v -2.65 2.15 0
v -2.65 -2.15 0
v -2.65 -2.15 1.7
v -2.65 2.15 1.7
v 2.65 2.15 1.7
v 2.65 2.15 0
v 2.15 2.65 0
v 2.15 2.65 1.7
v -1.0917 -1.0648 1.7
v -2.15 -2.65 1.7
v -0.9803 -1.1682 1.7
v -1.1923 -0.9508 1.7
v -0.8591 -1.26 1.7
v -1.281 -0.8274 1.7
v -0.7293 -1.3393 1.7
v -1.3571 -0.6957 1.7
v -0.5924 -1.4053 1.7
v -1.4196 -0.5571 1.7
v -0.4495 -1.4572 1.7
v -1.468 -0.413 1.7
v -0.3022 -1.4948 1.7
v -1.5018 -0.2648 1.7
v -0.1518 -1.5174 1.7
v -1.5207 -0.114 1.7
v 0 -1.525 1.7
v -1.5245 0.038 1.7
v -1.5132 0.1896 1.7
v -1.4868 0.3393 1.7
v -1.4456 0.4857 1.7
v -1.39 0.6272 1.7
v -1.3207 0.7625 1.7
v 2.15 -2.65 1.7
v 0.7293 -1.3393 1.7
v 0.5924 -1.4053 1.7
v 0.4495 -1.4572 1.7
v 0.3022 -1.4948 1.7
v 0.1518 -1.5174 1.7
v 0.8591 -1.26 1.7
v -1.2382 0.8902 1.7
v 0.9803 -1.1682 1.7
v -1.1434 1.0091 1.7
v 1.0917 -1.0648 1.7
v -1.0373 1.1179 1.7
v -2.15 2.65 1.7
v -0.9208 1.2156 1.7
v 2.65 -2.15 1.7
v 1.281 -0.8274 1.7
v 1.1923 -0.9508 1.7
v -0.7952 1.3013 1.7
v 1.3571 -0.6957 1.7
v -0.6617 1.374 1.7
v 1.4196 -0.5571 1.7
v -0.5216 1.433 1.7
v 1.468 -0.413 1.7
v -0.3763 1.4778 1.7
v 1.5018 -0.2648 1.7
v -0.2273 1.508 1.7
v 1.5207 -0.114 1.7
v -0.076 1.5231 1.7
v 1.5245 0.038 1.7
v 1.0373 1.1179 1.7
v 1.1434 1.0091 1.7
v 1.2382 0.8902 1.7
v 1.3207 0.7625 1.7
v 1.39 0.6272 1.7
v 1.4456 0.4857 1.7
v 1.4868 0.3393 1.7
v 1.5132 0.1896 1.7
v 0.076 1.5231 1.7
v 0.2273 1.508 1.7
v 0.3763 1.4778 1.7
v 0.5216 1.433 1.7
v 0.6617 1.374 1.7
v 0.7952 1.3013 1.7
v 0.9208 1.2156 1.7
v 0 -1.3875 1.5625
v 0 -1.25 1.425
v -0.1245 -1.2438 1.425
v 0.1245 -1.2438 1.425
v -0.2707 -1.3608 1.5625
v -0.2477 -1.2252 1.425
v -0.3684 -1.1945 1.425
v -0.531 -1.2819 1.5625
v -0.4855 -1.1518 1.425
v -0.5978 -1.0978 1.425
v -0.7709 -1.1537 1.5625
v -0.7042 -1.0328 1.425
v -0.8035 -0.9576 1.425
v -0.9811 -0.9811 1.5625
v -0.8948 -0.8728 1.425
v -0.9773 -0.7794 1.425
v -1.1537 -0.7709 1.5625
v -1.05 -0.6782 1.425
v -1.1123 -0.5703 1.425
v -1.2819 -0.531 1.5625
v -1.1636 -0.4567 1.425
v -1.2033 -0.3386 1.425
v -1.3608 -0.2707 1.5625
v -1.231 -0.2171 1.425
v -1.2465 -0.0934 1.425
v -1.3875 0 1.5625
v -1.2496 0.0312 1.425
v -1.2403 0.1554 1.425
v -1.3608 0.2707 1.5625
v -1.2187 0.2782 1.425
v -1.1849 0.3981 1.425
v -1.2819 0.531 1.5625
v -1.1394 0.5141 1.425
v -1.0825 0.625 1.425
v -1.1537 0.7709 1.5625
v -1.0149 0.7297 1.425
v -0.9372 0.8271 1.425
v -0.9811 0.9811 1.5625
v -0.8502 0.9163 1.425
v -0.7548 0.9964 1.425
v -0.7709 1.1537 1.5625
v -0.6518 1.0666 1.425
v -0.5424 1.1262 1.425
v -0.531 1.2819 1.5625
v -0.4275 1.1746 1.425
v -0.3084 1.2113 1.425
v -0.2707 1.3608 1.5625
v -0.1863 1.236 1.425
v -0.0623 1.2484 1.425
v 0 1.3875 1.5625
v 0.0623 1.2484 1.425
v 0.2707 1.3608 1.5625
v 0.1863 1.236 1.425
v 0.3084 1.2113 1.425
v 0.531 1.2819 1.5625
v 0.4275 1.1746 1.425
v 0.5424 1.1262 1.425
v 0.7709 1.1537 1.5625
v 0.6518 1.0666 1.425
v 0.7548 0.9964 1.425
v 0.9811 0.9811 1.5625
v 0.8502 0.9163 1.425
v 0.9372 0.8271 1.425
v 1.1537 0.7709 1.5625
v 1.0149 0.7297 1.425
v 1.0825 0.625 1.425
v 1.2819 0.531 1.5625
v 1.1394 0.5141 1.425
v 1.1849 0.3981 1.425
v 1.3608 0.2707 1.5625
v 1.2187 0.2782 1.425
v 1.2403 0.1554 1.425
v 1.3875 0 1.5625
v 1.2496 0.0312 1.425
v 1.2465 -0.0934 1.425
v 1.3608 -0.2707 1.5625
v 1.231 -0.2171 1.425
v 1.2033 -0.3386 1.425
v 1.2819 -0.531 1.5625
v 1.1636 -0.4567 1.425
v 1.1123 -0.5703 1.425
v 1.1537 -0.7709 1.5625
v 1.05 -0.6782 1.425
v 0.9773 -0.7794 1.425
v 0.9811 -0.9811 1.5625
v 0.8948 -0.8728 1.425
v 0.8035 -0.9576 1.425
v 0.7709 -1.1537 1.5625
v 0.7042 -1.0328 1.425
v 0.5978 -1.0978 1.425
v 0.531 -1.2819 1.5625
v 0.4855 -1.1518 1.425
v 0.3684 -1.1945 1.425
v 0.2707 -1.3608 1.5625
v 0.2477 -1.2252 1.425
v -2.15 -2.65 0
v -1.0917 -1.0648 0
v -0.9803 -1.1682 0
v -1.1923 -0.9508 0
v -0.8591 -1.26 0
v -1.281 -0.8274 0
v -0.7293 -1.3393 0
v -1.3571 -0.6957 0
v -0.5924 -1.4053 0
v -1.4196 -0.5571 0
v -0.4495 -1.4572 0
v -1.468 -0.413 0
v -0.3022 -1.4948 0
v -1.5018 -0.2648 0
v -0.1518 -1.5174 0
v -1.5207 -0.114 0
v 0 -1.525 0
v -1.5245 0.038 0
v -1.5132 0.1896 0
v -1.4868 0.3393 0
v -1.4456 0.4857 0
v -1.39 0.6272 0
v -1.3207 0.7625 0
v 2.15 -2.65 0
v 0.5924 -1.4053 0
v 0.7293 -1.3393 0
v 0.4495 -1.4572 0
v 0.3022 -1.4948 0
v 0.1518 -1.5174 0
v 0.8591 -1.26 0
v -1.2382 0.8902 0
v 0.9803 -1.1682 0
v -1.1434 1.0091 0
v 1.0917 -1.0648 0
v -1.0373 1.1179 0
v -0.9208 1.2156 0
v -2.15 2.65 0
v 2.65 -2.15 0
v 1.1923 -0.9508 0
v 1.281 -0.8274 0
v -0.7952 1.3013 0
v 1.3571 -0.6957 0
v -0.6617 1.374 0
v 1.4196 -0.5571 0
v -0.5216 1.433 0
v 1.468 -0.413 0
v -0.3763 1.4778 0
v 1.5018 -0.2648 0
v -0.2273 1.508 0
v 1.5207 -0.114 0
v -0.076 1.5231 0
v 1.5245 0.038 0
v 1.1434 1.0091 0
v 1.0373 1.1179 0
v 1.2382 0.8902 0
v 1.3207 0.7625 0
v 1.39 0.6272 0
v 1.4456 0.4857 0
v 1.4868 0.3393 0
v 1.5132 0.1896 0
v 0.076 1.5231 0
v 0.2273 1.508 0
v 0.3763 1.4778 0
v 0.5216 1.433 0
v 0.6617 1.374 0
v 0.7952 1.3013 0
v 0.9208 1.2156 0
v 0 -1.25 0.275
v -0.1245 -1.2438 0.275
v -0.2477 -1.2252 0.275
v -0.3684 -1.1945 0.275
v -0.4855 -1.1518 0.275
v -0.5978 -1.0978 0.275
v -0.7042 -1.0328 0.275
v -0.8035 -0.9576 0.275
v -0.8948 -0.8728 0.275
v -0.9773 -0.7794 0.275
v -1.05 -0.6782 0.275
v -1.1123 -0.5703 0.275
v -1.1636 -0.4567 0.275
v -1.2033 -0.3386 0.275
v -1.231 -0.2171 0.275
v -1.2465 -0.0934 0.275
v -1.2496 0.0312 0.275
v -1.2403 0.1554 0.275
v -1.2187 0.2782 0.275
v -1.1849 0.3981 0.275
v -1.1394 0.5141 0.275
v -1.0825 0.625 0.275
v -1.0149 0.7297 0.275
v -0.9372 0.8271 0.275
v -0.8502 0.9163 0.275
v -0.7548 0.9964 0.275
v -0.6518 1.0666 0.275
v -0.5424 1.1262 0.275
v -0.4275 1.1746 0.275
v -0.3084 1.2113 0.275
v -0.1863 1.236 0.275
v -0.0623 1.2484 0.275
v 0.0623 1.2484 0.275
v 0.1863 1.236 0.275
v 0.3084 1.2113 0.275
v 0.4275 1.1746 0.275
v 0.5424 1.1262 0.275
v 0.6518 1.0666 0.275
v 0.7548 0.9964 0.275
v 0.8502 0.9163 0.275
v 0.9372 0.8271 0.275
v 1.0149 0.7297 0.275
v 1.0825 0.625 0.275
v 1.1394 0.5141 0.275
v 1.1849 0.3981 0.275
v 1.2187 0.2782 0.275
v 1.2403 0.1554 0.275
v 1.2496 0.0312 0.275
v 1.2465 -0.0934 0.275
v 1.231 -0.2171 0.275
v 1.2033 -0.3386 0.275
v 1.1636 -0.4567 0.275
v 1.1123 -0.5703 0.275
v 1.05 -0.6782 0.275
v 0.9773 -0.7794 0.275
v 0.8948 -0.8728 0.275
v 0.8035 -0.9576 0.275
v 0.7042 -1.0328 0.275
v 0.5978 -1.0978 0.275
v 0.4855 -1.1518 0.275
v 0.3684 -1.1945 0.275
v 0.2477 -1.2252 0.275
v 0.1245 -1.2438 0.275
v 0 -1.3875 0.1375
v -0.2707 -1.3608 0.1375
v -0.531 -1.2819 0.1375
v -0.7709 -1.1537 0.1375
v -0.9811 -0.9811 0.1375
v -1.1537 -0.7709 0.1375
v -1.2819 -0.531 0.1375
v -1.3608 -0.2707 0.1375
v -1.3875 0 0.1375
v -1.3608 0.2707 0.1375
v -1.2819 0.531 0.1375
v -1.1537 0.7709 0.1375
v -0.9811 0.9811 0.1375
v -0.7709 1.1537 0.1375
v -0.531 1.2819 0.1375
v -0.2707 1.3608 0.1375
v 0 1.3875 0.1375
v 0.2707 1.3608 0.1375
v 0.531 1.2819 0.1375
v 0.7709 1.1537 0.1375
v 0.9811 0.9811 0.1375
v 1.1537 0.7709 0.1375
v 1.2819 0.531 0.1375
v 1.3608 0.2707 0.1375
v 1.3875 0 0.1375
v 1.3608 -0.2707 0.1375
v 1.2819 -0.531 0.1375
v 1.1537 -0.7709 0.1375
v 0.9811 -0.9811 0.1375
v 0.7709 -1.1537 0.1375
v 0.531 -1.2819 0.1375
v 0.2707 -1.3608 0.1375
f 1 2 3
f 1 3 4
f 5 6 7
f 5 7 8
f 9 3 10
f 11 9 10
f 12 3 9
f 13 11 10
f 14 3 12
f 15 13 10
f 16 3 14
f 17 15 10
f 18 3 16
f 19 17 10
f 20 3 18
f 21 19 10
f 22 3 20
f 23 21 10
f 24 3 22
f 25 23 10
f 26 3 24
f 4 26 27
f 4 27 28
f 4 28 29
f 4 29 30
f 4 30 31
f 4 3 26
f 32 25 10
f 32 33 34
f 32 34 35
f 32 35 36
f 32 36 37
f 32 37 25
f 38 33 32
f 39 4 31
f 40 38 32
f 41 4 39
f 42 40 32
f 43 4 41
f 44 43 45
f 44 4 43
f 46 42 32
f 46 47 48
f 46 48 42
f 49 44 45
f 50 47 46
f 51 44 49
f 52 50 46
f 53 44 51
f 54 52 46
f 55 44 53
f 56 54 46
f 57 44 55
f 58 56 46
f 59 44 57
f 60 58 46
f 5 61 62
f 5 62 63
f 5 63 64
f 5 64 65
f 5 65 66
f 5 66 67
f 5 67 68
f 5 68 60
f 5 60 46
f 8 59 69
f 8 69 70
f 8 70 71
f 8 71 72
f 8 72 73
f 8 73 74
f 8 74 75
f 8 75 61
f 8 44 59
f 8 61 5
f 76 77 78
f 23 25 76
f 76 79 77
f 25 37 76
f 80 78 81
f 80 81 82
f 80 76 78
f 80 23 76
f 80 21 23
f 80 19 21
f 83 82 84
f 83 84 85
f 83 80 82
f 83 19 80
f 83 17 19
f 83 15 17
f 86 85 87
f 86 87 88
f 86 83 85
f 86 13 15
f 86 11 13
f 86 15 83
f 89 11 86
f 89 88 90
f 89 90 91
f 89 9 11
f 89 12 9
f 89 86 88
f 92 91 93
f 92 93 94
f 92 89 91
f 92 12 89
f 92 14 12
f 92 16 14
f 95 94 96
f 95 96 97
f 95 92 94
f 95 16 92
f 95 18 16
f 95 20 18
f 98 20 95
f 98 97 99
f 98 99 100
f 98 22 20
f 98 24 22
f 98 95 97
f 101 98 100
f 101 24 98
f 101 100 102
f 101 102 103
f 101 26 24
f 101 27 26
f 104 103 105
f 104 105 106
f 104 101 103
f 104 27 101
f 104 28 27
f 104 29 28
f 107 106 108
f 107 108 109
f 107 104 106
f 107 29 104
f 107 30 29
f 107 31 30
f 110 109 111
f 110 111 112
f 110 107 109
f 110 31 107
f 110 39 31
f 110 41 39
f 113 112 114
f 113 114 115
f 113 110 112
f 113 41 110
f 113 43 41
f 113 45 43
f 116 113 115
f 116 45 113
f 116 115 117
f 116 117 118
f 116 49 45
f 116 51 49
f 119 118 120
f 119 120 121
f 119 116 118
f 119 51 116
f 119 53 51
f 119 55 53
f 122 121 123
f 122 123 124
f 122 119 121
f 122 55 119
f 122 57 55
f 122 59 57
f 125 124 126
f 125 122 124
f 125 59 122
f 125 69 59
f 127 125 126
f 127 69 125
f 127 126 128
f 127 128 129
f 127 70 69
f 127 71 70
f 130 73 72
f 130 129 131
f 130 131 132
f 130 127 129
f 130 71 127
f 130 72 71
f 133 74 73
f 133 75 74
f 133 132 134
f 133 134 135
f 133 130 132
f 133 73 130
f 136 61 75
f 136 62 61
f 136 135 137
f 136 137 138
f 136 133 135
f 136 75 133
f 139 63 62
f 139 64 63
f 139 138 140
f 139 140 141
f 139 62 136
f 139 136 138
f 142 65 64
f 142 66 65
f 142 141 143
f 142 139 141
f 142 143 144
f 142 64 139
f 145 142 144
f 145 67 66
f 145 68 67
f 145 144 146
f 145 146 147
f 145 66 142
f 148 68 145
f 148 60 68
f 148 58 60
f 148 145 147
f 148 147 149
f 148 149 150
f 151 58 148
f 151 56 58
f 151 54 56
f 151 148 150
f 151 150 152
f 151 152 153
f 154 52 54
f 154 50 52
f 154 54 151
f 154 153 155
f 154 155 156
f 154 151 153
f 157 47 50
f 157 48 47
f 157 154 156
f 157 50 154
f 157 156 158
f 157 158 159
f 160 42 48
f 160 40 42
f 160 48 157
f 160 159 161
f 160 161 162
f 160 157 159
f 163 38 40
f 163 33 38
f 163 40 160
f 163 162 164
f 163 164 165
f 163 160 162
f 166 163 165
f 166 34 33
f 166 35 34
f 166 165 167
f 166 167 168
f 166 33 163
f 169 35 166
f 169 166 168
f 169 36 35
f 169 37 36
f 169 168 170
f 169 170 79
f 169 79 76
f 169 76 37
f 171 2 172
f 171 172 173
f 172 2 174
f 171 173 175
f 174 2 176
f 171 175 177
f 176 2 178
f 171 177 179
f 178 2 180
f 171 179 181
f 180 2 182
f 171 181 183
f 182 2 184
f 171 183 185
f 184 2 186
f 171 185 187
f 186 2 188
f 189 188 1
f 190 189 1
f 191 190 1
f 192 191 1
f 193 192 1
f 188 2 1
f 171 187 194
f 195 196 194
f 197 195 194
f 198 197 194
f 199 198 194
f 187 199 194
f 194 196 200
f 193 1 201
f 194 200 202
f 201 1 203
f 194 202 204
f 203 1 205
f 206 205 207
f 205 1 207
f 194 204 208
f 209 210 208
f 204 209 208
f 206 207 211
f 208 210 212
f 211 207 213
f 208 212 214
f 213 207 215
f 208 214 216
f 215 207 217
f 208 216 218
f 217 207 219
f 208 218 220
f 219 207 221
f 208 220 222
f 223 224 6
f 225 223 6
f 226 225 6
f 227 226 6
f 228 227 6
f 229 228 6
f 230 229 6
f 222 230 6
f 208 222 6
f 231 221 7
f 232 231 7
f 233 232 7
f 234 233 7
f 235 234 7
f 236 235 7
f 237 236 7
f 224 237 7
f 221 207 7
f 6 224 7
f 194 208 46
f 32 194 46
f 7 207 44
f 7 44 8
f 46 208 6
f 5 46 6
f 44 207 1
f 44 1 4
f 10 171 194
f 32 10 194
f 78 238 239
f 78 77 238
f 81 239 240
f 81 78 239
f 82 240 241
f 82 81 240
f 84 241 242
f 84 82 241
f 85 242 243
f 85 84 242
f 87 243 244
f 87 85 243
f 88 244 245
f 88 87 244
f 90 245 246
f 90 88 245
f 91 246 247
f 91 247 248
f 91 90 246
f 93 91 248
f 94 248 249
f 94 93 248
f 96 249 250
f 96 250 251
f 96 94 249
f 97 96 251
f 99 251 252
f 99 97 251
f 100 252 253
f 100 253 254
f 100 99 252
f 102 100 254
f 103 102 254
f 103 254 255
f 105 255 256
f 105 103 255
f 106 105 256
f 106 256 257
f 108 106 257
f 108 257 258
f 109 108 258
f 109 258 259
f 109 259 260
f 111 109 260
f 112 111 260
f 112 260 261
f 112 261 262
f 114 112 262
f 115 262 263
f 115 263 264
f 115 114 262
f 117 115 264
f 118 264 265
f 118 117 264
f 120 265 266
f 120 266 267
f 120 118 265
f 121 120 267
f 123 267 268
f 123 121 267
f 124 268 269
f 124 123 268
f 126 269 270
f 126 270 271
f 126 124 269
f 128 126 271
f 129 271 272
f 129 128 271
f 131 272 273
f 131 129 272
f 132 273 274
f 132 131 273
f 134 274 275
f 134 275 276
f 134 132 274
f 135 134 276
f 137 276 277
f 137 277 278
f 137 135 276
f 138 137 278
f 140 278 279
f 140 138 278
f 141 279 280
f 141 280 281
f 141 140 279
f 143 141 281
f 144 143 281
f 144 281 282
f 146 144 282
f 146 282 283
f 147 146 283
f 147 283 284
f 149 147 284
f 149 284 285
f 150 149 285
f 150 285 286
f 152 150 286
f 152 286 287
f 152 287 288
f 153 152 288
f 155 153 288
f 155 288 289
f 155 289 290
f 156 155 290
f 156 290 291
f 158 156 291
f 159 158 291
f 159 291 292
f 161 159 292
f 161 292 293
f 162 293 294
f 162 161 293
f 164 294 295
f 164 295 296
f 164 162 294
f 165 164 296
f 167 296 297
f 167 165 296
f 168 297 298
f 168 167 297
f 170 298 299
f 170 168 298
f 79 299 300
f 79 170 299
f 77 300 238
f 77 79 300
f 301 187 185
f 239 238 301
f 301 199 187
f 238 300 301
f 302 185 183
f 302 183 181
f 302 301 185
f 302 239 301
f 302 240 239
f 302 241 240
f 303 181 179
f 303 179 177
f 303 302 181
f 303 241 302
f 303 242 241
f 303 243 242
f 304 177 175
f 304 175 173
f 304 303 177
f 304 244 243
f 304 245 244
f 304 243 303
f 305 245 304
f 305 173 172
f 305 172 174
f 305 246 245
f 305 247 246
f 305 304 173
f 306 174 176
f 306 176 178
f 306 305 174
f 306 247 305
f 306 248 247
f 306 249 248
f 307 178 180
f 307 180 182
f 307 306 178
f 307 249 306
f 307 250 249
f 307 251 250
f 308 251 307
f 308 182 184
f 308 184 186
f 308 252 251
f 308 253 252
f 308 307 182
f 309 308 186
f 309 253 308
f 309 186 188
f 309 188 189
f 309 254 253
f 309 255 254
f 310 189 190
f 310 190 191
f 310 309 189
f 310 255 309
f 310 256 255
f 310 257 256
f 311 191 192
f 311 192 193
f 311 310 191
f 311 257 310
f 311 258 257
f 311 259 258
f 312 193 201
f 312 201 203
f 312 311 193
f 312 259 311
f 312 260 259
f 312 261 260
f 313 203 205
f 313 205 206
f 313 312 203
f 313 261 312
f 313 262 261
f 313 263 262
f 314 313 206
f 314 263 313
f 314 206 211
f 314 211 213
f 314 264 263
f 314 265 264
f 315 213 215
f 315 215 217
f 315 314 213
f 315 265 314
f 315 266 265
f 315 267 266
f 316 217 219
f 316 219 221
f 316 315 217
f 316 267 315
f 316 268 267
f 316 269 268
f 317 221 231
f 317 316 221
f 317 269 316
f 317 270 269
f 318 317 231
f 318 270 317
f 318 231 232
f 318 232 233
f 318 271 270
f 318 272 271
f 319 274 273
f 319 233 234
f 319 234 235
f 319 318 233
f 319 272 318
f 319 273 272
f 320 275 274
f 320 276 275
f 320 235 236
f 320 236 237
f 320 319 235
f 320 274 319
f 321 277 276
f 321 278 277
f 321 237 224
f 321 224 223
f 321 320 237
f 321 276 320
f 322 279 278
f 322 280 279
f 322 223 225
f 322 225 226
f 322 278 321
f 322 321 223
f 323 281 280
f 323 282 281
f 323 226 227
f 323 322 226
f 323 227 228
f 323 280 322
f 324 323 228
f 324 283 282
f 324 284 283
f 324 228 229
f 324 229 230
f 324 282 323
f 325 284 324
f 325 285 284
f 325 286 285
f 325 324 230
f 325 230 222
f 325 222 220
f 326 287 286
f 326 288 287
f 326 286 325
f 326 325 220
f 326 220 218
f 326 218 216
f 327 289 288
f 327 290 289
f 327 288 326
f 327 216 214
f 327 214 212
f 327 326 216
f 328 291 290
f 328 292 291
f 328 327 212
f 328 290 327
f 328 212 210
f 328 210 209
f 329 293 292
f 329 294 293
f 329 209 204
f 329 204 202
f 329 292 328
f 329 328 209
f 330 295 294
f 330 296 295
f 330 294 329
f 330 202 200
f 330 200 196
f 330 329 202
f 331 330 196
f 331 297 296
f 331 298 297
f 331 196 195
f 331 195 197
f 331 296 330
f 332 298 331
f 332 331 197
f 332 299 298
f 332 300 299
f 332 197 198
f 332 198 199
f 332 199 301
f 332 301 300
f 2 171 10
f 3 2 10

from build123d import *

# Parameters (mm, degrees)
SKETCH_1_W      = 5.3
SKETCH_1_H      = 5.3
EXTRUDE_1_DEPTH = 1.7
CHAMFER_1_SIZE  = 0.5


with BuildPart() as part:
    # 草图1 → 凸台-拉伸1 (new body)
    with BuildSketch(Plane.XY):
        Rectangle(SKETCH_1_W, SKETCH_1_H)
    extrude(amount=EXTRUDE_1_DEPTH)

    # 草图3 → M3 螺纹孔1 (revolve, cut)
    with BuildSketch(Plane(origin=(0, 0, 1.7), x_dir=(0, -1, 0), z_dir=(1, 0, 0))):
        Polygon((0, 0), (0, 1.7), (1.525, 1.7), (1.25, 1.425), (1.25, 0.275), (1.525, 0), align=None)
    revolve(axis=Axis((0, 0, 8.05), (0, 0, -1)), mode=Mode.SUBTRACT)

    # 倒角1
    chamfer_1_edges = [part.edges().sort_by_distance(p)[0] for p in [
        (2.65, -2.65, 0.85),
        (-2.65, -2.65, 0.85),
        (-2.65, 2.65, 0.85),
        (2.65, 2.65, 0.85),
    ]]
    chamfer(chamfer_1_edges, length=CHAMFER_1_SIZE)


solid = part.part
